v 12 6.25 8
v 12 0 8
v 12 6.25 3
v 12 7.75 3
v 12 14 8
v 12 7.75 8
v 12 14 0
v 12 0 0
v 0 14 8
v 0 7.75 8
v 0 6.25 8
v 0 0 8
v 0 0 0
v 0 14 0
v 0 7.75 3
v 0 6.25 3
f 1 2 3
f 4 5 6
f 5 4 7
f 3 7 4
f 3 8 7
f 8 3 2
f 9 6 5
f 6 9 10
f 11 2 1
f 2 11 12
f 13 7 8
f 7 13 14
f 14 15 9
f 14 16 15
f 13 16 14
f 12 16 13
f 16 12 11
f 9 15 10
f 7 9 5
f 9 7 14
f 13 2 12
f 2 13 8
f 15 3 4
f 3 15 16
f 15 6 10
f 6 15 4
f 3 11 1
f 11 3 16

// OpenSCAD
$fn = 32;

// ----------------------------------------------------------------------
// Micro clip: slotted block, 5-20 mm class
// ----------------------------------------------------------------------

// --- parameters (mm) ---
block_l = 12;             // block length, X
block_w = 14;             // block width, Y
block_h = 8;              // block height, Z
slot_w = 1.5;             // slot width
slot_d = 5;               // slot depth from the top

difference() {
  cube([block_l, block_w, block_h]);
  translate([-1, block_w / 2 - slot_w / 2, block_h - slot_d])
    cube([block_l + 2, slot_w, slot_d + 1]);
}
